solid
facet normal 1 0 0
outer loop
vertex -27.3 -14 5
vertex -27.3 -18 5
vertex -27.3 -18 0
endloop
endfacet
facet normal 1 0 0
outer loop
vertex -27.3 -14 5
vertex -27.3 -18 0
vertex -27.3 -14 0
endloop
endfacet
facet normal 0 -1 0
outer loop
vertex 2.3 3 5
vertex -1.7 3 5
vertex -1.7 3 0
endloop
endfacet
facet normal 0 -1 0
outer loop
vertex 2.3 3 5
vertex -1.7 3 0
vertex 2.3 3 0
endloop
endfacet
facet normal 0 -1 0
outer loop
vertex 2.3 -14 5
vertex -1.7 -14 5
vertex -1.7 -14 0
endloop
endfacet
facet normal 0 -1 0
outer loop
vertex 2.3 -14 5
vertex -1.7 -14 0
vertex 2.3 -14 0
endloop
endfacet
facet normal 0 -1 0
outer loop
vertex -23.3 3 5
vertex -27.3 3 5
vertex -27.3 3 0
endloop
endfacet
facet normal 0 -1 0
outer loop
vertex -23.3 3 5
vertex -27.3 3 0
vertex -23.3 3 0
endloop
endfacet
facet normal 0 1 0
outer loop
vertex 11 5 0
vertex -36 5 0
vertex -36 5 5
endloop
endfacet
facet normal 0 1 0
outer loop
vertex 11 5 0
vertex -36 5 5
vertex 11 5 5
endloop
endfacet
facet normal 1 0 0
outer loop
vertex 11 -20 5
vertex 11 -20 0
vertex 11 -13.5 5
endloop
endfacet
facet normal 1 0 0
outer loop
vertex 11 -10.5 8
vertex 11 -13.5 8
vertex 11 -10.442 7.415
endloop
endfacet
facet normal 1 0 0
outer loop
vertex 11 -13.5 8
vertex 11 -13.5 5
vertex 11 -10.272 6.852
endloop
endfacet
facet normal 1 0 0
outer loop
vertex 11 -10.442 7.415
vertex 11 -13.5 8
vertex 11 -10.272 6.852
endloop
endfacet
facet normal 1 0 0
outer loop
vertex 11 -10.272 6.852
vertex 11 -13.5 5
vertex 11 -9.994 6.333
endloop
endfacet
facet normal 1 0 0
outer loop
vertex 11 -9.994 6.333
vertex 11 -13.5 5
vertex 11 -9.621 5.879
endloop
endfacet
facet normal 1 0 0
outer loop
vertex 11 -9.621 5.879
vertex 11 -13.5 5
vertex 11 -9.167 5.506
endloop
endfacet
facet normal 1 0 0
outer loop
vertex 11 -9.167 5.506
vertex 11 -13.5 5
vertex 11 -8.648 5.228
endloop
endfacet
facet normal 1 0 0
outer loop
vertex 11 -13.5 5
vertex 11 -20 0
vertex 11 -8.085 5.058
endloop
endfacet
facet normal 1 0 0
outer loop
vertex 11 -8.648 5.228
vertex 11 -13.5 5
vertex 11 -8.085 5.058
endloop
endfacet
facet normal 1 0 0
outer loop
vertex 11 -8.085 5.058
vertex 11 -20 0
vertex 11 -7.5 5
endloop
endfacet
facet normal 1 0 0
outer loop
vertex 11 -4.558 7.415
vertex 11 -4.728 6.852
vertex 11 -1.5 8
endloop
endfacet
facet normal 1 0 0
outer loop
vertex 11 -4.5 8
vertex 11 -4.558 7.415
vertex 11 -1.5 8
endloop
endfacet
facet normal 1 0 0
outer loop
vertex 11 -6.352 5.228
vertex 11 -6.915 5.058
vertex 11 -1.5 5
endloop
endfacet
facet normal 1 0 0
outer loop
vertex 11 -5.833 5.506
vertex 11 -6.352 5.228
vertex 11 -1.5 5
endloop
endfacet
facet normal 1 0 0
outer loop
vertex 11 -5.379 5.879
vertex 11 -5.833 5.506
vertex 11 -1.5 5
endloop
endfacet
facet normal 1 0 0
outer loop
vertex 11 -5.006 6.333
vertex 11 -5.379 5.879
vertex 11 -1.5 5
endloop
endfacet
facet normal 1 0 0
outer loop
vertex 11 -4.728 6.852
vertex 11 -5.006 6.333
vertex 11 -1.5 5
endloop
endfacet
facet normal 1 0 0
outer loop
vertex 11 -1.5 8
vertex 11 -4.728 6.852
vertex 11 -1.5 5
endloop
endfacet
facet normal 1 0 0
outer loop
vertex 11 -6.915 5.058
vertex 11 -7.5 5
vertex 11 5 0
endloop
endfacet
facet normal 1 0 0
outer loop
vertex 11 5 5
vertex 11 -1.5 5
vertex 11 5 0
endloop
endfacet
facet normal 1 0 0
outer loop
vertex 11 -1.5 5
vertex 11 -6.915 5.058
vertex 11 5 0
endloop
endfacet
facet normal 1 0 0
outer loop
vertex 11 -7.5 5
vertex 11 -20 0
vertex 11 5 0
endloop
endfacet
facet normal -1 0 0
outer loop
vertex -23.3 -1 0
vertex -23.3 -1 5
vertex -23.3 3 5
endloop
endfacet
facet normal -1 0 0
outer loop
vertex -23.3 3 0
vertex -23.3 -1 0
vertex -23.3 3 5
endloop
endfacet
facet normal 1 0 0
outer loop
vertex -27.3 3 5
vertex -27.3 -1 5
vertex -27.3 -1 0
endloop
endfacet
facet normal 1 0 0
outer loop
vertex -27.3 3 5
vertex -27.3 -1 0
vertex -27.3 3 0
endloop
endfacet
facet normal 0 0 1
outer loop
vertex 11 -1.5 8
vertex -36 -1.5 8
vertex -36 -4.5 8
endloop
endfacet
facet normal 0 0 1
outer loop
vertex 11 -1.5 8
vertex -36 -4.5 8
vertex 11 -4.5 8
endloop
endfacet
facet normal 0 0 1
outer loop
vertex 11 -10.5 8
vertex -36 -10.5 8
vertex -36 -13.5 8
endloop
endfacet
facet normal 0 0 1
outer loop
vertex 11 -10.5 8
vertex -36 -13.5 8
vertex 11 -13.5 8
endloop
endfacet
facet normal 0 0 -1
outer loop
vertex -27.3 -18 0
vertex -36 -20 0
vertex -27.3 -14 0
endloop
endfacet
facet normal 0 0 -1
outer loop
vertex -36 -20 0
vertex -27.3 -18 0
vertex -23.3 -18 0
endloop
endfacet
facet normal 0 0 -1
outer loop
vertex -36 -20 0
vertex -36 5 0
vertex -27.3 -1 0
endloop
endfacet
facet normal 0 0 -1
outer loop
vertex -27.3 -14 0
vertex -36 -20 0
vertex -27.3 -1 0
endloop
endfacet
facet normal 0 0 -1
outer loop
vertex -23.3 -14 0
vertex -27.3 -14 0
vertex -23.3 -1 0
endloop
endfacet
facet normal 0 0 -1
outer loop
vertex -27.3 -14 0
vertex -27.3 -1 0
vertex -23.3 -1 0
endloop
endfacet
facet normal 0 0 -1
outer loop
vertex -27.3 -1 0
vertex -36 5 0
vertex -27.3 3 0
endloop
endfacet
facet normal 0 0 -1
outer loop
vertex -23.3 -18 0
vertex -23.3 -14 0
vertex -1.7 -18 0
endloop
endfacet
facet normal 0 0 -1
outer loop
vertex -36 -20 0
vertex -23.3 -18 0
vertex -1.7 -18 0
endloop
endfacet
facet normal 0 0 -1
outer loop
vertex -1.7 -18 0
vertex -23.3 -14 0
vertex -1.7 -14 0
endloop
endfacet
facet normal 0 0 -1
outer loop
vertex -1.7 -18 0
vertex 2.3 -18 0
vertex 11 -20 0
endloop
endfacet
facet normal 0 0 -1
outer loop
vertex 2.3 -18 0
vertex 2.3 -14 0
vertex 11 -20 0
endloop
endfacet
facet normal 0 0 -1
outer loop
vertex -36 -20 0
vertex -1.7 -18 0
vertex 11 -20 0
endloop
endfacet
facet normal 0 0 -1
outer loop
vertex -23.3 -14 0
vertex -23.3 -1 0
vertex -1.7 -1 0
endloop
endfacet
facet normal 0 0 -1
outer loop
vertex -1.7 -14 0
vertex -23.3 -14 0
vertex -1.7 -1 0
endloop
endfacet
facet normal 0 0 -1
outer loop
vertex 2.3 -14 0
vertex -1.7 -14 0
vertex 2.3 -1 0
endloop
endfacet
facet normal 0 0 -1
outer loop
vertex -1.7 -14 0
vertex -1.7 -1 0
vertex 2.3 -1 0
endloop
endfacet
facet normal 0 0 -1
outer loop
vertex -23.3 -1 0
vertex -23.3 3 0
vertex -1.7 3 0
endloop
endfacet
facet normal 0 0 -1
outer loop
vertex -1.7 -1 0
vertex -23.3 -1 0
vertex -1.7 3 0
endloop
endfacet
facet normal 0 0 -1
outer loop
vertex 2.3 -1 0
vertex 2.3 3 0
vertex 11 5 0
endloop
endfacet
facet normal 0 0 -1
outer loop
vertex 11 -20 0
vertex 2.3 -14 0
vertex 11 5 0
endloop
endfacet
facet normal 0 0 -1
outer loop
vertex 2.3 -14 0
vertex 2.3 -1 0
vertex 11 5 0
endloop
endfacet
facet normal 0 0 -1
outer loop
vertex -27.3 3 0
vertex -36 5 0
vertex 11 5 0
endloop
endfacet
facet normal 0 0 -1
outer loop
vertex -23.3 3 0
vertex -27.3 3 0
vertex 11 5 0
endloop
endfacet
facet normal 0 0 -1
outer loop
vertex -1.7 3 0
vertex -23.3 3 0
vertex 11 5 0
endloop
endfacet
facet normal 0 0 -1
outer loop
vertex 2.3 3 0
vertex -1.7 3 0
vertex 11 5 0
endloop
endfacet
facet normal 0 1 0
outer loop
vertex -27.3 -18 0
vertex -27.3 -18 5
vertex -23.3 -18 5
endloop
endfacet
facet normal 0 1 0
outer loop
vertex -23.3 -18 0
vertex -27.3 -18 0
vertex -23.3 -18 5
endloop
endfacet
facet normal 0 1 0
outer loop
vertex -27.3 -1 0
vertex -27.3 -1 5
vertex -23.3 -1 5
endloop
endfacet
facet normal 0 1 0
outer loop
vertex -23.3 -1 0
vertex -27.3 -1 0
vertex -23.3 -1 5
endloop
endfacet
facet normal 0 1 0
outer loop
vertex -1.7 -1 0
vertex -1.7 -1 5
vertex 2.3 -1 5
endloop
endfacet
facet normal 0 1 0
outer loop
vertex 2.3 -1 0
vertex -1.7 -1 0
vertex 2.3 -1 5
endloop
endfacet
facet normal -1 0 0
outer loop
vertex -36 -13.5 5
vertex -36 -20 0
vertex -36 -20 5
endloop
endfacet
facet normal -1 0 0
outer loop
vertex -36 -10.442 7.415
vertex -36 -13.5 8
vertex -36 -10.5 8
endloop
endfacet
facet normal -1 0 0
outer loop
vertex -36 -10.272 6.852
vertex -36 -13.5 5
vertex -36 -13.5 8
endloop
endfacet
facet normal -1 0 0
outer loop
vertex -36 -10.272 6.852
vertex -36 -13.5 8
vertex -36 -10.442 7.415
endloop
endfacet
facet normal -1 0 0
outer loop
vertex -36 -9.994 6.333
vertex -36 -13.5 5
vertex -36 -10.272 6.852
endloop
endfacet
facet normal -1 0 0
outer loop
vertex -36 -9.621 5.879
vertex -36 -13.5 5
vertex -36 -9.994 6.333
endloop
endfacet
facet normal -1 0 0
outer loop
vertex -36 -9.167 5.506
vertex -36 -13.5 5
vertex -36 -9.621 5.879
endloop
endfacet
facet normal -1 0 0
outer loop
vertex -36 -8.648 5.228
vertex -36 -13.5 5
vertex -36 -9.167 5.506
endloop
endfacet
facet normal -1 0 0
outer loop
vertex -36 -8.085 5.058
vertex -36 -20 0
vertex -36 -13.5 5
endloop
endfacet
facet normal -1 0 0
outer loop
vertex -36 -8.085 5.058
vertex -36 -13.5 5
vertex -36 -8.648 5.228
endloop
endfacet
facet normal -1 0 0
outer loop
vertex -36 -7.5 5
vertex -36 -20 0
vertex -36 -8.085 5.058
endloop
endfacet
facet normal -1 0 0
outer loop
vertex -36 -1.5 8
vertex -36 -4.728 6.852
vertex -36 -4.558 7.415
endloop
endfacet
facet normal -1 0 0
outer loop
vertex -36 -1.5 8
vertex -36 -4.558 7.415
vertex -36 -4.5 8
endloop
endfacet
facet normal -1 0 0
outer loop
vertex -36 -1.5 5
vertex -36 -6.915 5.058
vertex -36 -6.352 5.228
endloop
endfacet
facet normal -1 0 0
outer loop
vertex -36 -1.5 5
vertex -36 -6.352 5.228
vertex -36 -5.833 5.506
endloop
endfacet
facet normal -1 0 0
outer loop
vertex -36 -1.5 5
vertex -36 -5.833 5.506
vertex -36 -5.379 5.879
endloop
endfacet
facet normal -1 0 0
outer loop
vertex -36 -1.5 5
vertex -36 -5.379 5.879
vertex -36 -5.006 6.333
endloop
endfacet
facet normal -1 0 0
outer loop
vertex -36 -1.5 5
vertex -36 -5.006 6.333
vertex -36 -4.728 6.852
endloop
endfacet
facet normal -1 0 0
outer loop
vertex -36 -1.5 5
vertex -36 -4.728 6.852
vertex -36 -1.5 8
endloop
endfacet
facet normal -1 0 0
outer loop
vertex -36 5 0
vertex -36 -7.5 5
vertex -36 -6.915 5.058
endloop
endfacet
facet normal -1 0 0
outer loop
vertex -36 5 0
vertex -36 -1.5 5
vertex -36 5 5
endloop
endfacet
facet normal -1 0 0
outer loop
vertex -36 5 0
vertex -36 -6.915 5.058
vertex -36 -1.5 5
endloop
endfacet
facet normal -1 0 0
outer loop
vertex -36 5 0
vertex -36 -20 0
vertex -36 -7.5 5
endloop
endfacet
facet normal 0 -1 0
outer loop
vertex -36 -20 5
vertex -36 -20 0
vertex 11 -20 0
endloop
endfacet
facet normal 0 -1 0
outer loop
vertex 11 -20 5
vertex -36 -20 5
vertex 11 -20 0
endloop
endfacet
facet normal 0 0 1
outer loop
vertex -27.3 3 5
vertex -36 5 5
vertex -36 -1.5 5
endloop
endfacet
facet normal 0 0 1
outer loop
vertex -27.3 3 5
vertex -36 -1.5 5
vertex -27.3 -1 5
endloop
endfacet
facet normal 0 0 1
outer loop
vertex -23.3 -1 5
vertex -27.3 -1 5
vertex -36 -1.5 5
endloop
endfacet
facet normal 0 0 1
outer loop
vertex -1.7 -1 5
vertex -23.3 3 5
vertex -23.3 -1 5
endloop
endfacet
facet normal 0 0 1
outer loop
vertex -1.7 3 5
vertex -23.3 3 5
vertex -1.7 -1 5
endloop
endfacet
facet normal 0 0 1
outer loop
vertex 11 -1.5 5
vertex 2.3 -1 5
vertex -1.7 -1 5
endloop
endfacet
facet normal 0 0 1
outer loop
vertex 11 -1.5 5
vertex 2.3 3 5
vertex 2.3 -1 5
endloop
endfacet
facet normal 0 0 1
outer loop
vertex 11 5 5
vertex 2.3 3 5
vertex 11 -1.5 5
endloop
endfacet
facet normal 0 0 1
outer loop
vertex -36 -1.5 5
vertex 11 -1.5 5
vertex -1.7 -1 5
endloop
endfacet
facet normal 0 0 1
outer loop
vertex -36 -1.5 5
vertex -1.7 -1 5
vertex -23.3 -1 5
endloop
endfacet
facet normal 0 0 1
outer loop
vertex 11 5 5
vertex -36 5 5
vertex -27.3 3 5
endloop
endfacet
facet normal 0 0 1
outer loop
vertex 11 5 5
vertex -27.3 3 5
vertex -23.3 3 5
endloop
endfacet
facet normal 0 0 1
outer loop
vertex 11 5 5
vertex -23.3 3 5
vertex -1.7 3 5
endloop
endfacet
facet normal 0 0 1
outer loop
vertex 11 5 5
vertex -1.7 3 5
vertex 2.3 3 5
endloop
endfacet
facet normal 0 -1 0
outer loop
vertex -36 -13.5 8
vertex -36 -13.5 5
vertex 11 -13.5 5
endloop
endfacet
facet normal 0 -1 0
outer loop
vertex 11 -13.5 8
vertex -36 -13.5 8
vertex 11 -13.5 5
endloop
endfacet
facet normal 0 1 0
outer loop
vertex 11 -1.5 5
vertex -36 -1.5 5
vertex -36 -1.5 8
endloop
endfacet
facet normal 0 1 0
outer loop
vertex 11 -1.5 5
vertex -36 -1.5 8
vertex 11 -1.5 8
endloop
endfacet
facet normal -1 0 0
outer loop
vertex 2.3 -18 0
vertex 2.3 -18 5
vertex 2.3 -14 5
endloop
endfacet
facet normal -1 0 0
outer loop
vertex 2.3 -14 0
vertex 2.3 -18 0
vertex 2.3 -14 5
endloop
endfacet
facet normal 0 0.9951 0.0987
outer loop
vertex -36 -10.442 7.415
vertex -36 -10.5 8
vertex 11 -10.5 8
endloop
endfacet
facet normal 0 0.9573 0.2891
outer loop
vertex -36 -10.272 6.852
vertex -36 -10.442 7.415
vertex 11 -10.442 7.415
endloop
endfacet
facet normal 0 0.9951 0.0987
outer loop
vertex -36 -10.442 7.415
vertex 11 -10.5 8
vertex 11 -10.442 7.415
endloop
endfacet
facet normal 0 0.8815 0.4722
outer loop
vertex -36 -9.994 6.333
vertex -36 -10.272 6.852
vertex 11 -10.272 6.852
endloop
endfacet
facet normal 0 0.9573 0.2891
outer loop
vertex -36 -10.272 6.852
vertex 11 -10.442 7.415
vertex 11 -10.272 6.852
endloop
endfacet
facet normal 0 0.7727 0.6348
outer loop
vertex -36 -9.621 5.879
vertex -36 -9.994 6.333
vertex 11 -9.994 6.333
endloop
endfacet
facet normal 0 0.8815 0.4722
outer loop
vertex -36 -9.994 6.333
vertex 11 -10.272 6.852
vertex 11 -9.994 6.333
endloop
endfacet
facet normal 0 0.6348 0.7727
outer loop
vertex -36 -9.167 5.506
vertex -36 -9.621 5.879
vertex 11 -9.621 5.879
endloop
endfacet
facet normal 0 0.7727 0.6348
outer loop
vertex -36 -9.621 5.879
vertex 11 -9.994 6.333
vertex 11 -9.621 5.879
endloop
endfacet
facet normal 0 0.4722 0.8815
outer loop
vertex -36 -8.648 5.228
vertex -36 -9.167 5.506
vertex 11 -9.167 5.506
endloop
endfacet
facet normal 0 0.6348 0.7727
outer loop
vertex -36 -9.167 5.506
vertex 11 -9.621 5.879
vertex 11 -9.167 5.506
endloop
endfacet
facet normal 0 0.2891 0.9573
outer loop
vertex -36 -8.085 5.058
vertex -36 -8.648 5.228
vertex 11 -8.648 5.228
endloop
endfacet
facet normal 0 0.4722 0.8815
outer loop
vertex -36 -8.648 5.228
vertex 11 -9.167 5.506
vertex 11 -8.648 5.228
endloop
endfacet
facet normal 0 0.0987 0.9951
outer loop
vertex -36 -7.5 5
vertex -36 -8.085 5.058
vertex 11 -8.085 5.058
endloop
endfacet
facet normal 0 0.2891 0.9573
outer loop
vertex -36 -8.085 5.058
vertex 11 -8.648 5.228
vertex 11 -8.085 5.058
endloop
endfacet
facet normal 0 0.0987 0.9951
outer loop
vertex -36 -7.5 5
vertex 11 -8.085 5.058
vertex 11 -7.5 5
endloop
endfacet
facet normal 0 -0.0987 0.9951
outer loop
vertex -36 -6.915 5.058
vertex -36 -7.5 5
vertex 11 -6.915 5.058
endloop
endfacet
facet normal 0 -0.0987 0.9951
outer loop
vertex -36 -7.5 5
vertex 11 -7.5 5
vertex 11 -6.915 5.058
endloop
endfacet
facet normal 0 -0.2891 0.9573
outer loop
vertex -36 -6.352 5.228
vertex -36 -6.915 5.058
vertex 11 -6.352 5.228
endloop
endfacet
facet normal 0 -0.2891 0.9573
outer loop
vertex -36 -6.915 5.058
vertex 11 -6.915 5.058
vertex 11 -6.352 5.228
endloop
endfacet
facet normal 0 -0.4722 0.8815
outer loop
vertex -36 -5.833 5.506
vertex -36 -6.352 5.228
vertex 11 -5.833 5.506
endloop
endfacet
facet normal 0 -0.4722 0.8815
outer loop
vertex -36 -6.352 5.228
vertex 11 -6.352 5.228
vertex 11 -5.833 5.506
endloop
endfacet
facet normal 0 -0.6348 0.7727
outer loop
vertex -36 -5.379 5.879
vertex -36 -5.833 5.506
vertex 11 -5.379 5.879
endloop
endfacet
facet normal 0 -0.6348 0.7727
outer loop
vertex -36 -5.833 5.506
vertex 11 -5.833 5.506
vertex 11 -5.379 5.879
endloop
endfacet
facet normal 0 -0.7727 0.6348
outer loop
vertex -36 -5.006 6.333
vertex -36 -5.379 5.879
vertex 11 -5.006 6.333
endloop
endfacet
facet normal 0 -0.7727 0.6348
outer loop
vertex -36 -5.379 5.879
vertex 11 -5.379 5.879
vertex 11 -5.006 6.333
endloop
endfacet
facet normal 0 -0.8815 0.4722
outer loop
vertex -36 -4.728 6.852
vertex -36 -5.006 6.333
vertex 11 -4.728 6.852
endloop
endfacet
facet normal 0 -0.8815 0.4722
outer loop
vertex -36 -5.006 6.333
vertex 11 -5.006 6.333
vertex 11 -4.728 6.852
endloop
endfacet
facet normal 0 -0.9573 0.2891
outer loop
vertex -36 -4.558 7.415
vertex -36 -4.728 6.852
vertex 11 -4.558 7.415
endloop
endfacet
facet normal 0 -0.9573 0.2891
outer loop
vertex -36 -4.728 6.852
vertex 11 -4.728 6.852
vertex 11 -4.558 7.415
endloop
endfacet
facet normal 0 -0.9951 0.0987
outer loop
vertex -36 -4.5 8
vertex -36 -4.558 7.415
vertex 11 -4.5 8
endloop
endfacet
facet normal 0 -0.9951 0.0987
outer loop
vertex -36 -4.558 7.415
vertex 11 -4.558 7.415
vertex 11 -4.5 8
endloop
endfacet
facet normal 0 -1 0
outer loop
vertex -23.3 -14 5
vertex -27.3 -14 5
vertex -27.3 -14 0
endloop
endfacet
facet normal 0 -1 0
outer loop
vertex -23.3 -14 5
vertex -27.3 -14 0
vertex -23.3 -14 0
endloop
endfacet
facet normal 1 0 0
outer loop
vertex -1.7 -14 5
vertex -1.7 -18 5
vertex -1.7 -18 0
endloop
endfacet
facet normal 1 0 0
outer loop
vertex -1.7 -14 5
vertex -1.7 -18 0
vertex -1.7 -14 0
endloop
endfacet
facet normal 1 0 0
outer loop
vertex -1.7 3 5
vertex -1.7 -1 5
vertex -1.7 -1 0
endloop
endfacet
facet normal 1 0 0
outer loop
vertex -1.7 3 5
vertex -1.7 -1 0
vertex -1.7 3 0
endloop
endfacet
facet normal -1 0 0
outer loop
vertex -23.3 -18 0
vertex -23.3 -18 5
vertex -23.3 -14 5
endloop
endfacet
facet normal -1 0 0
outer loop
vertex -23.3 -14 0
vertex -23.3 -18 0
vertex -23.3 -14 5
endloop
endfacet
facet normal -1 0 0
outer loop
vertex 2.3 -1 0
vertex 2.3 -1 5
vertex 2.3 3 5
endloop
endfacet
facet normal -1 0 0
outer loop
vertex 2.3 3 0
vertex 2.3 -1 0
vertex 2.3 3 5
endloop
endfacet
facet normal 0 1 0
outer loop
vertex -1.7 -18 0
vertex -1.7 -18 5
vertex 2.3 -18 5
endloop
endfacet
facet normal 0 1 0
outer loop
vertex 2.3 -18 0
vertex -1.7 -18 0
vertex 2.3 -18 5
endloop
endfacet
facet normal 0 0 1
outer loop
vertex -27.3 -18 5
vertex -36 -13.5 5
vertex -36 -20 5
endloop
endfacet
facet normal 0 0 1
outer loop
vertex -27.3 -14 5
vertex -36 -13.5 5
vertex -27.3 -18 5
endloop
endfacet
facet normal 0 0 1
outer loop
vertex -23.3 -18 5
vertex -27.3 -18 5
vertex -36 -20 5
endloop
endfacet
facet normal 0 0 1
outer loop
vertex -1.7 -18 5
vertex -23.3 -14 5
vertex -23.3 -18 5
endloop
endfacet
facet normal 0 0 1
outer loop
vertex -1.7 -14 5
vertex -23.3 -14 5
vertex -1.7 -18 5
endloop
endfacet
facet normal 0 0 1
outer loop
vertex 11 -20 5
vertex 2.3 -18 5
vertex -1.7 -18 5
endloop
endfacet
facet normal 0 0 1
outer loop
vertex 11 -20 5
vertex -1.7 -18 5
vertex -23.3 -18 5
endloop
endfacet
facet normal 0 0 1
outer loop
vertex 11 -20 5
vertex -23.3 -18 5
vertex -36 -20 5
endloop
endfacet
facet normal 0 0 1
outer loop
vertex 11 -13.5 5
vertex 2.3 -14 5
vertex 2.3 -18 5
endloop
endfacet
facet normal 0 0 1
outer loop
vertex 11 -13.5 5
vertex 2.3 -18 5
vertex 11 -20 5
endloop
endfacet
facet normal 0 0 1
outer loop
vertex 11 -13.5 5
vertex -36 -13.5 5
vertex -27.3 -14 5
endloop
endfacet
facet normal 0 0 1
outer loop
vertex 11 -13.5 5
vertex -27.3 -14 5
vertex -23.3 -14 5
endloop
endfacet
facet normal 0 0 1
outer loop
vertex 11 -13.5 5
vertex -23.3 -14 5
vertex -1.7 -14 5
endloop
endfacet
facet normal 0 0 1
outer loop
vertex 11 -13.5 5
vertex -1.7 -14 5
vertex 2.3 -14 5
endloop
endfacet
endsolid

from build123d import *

# Parameters (mm, degrees)
ESQUISSE1_W             = 47
ESQUISSE1_H             = 25
BOSS_EXTRU_1_DEPTH      = 5
ESQUISSE2_W             = 4
ESQUISSE2_H             = 4
ENL_V_MAT_EXTRU_1_DEPTH = 5
ESQUISSE4_W             = 47
ESQUISSE4_H             = 12
BOSS_EXTRU_2_DEPTH      = 3
ESQUISSE5_R             = 3
ENL_V_MAT_EXTRU_2_DEPTH = 63


with BuildPart() as part:
    # Esquisse1 → Boss.-Extru.1 (new body)
    with BuildSketch(Plane.XY):
        with Locations((-12.5, -7.5)):
            Rectangle(ESQUISSE1_W, ESQUISSE1_H)
    extrude(amount=BOSS_EXTRU_1_DEPTH)

    # Esquisse2 → Enlèv. mat.-Extru.1 (cut)
    with BuildSketch(Plane.XY.offset(5)):
        with Locations((-25.3, -16)):
            Rectangle(ESQUISSE2_W, ESQUISSE2_H)
        with Locations((-25.3, 1)):
            Rectangle(ESQUISSE2_W, ESQUISSE2_H)
        with Locations((0.3, 1)):
            Rectangle(ESQUISSE2_W, ESQUISSE2_H)
        with Locations((0.3, -16)):
            Rectangle(ESQUISSE2_W, ESQUISSE2_H)
    extrude(amount=-ENL_V_MAT_EXTRU_1_DEPTH, mode=Mode.SUBTRACT)

    # Esquisse4 → Boss.-Extru.2 (add)
    with BuildSketch(Plane.XY.offset(5)):
        with Locations((-12.5, -7.5)):
            Rectangle(ESQUISSE4_W, ESQUISSE4_H)
    extrude(amount=BOSS_EXTRU_2_DEPTH)

    # Esquisse5 → Enlèv. mat.-Extru.2 (cut)
    with BuildSketch(Plane(origin=(11, 0, 0), x_dir=(0, 0, -1), z_dir=(1, 0, 0))):
        with Locations((-8, -7.5)):
            Circle(ESQUISSE5_R)
    extrude(amount=-ENL_V_MAT_EXTRU_2_DEPTH, mode=Mode.SUBTRACT)


solid = part.part
